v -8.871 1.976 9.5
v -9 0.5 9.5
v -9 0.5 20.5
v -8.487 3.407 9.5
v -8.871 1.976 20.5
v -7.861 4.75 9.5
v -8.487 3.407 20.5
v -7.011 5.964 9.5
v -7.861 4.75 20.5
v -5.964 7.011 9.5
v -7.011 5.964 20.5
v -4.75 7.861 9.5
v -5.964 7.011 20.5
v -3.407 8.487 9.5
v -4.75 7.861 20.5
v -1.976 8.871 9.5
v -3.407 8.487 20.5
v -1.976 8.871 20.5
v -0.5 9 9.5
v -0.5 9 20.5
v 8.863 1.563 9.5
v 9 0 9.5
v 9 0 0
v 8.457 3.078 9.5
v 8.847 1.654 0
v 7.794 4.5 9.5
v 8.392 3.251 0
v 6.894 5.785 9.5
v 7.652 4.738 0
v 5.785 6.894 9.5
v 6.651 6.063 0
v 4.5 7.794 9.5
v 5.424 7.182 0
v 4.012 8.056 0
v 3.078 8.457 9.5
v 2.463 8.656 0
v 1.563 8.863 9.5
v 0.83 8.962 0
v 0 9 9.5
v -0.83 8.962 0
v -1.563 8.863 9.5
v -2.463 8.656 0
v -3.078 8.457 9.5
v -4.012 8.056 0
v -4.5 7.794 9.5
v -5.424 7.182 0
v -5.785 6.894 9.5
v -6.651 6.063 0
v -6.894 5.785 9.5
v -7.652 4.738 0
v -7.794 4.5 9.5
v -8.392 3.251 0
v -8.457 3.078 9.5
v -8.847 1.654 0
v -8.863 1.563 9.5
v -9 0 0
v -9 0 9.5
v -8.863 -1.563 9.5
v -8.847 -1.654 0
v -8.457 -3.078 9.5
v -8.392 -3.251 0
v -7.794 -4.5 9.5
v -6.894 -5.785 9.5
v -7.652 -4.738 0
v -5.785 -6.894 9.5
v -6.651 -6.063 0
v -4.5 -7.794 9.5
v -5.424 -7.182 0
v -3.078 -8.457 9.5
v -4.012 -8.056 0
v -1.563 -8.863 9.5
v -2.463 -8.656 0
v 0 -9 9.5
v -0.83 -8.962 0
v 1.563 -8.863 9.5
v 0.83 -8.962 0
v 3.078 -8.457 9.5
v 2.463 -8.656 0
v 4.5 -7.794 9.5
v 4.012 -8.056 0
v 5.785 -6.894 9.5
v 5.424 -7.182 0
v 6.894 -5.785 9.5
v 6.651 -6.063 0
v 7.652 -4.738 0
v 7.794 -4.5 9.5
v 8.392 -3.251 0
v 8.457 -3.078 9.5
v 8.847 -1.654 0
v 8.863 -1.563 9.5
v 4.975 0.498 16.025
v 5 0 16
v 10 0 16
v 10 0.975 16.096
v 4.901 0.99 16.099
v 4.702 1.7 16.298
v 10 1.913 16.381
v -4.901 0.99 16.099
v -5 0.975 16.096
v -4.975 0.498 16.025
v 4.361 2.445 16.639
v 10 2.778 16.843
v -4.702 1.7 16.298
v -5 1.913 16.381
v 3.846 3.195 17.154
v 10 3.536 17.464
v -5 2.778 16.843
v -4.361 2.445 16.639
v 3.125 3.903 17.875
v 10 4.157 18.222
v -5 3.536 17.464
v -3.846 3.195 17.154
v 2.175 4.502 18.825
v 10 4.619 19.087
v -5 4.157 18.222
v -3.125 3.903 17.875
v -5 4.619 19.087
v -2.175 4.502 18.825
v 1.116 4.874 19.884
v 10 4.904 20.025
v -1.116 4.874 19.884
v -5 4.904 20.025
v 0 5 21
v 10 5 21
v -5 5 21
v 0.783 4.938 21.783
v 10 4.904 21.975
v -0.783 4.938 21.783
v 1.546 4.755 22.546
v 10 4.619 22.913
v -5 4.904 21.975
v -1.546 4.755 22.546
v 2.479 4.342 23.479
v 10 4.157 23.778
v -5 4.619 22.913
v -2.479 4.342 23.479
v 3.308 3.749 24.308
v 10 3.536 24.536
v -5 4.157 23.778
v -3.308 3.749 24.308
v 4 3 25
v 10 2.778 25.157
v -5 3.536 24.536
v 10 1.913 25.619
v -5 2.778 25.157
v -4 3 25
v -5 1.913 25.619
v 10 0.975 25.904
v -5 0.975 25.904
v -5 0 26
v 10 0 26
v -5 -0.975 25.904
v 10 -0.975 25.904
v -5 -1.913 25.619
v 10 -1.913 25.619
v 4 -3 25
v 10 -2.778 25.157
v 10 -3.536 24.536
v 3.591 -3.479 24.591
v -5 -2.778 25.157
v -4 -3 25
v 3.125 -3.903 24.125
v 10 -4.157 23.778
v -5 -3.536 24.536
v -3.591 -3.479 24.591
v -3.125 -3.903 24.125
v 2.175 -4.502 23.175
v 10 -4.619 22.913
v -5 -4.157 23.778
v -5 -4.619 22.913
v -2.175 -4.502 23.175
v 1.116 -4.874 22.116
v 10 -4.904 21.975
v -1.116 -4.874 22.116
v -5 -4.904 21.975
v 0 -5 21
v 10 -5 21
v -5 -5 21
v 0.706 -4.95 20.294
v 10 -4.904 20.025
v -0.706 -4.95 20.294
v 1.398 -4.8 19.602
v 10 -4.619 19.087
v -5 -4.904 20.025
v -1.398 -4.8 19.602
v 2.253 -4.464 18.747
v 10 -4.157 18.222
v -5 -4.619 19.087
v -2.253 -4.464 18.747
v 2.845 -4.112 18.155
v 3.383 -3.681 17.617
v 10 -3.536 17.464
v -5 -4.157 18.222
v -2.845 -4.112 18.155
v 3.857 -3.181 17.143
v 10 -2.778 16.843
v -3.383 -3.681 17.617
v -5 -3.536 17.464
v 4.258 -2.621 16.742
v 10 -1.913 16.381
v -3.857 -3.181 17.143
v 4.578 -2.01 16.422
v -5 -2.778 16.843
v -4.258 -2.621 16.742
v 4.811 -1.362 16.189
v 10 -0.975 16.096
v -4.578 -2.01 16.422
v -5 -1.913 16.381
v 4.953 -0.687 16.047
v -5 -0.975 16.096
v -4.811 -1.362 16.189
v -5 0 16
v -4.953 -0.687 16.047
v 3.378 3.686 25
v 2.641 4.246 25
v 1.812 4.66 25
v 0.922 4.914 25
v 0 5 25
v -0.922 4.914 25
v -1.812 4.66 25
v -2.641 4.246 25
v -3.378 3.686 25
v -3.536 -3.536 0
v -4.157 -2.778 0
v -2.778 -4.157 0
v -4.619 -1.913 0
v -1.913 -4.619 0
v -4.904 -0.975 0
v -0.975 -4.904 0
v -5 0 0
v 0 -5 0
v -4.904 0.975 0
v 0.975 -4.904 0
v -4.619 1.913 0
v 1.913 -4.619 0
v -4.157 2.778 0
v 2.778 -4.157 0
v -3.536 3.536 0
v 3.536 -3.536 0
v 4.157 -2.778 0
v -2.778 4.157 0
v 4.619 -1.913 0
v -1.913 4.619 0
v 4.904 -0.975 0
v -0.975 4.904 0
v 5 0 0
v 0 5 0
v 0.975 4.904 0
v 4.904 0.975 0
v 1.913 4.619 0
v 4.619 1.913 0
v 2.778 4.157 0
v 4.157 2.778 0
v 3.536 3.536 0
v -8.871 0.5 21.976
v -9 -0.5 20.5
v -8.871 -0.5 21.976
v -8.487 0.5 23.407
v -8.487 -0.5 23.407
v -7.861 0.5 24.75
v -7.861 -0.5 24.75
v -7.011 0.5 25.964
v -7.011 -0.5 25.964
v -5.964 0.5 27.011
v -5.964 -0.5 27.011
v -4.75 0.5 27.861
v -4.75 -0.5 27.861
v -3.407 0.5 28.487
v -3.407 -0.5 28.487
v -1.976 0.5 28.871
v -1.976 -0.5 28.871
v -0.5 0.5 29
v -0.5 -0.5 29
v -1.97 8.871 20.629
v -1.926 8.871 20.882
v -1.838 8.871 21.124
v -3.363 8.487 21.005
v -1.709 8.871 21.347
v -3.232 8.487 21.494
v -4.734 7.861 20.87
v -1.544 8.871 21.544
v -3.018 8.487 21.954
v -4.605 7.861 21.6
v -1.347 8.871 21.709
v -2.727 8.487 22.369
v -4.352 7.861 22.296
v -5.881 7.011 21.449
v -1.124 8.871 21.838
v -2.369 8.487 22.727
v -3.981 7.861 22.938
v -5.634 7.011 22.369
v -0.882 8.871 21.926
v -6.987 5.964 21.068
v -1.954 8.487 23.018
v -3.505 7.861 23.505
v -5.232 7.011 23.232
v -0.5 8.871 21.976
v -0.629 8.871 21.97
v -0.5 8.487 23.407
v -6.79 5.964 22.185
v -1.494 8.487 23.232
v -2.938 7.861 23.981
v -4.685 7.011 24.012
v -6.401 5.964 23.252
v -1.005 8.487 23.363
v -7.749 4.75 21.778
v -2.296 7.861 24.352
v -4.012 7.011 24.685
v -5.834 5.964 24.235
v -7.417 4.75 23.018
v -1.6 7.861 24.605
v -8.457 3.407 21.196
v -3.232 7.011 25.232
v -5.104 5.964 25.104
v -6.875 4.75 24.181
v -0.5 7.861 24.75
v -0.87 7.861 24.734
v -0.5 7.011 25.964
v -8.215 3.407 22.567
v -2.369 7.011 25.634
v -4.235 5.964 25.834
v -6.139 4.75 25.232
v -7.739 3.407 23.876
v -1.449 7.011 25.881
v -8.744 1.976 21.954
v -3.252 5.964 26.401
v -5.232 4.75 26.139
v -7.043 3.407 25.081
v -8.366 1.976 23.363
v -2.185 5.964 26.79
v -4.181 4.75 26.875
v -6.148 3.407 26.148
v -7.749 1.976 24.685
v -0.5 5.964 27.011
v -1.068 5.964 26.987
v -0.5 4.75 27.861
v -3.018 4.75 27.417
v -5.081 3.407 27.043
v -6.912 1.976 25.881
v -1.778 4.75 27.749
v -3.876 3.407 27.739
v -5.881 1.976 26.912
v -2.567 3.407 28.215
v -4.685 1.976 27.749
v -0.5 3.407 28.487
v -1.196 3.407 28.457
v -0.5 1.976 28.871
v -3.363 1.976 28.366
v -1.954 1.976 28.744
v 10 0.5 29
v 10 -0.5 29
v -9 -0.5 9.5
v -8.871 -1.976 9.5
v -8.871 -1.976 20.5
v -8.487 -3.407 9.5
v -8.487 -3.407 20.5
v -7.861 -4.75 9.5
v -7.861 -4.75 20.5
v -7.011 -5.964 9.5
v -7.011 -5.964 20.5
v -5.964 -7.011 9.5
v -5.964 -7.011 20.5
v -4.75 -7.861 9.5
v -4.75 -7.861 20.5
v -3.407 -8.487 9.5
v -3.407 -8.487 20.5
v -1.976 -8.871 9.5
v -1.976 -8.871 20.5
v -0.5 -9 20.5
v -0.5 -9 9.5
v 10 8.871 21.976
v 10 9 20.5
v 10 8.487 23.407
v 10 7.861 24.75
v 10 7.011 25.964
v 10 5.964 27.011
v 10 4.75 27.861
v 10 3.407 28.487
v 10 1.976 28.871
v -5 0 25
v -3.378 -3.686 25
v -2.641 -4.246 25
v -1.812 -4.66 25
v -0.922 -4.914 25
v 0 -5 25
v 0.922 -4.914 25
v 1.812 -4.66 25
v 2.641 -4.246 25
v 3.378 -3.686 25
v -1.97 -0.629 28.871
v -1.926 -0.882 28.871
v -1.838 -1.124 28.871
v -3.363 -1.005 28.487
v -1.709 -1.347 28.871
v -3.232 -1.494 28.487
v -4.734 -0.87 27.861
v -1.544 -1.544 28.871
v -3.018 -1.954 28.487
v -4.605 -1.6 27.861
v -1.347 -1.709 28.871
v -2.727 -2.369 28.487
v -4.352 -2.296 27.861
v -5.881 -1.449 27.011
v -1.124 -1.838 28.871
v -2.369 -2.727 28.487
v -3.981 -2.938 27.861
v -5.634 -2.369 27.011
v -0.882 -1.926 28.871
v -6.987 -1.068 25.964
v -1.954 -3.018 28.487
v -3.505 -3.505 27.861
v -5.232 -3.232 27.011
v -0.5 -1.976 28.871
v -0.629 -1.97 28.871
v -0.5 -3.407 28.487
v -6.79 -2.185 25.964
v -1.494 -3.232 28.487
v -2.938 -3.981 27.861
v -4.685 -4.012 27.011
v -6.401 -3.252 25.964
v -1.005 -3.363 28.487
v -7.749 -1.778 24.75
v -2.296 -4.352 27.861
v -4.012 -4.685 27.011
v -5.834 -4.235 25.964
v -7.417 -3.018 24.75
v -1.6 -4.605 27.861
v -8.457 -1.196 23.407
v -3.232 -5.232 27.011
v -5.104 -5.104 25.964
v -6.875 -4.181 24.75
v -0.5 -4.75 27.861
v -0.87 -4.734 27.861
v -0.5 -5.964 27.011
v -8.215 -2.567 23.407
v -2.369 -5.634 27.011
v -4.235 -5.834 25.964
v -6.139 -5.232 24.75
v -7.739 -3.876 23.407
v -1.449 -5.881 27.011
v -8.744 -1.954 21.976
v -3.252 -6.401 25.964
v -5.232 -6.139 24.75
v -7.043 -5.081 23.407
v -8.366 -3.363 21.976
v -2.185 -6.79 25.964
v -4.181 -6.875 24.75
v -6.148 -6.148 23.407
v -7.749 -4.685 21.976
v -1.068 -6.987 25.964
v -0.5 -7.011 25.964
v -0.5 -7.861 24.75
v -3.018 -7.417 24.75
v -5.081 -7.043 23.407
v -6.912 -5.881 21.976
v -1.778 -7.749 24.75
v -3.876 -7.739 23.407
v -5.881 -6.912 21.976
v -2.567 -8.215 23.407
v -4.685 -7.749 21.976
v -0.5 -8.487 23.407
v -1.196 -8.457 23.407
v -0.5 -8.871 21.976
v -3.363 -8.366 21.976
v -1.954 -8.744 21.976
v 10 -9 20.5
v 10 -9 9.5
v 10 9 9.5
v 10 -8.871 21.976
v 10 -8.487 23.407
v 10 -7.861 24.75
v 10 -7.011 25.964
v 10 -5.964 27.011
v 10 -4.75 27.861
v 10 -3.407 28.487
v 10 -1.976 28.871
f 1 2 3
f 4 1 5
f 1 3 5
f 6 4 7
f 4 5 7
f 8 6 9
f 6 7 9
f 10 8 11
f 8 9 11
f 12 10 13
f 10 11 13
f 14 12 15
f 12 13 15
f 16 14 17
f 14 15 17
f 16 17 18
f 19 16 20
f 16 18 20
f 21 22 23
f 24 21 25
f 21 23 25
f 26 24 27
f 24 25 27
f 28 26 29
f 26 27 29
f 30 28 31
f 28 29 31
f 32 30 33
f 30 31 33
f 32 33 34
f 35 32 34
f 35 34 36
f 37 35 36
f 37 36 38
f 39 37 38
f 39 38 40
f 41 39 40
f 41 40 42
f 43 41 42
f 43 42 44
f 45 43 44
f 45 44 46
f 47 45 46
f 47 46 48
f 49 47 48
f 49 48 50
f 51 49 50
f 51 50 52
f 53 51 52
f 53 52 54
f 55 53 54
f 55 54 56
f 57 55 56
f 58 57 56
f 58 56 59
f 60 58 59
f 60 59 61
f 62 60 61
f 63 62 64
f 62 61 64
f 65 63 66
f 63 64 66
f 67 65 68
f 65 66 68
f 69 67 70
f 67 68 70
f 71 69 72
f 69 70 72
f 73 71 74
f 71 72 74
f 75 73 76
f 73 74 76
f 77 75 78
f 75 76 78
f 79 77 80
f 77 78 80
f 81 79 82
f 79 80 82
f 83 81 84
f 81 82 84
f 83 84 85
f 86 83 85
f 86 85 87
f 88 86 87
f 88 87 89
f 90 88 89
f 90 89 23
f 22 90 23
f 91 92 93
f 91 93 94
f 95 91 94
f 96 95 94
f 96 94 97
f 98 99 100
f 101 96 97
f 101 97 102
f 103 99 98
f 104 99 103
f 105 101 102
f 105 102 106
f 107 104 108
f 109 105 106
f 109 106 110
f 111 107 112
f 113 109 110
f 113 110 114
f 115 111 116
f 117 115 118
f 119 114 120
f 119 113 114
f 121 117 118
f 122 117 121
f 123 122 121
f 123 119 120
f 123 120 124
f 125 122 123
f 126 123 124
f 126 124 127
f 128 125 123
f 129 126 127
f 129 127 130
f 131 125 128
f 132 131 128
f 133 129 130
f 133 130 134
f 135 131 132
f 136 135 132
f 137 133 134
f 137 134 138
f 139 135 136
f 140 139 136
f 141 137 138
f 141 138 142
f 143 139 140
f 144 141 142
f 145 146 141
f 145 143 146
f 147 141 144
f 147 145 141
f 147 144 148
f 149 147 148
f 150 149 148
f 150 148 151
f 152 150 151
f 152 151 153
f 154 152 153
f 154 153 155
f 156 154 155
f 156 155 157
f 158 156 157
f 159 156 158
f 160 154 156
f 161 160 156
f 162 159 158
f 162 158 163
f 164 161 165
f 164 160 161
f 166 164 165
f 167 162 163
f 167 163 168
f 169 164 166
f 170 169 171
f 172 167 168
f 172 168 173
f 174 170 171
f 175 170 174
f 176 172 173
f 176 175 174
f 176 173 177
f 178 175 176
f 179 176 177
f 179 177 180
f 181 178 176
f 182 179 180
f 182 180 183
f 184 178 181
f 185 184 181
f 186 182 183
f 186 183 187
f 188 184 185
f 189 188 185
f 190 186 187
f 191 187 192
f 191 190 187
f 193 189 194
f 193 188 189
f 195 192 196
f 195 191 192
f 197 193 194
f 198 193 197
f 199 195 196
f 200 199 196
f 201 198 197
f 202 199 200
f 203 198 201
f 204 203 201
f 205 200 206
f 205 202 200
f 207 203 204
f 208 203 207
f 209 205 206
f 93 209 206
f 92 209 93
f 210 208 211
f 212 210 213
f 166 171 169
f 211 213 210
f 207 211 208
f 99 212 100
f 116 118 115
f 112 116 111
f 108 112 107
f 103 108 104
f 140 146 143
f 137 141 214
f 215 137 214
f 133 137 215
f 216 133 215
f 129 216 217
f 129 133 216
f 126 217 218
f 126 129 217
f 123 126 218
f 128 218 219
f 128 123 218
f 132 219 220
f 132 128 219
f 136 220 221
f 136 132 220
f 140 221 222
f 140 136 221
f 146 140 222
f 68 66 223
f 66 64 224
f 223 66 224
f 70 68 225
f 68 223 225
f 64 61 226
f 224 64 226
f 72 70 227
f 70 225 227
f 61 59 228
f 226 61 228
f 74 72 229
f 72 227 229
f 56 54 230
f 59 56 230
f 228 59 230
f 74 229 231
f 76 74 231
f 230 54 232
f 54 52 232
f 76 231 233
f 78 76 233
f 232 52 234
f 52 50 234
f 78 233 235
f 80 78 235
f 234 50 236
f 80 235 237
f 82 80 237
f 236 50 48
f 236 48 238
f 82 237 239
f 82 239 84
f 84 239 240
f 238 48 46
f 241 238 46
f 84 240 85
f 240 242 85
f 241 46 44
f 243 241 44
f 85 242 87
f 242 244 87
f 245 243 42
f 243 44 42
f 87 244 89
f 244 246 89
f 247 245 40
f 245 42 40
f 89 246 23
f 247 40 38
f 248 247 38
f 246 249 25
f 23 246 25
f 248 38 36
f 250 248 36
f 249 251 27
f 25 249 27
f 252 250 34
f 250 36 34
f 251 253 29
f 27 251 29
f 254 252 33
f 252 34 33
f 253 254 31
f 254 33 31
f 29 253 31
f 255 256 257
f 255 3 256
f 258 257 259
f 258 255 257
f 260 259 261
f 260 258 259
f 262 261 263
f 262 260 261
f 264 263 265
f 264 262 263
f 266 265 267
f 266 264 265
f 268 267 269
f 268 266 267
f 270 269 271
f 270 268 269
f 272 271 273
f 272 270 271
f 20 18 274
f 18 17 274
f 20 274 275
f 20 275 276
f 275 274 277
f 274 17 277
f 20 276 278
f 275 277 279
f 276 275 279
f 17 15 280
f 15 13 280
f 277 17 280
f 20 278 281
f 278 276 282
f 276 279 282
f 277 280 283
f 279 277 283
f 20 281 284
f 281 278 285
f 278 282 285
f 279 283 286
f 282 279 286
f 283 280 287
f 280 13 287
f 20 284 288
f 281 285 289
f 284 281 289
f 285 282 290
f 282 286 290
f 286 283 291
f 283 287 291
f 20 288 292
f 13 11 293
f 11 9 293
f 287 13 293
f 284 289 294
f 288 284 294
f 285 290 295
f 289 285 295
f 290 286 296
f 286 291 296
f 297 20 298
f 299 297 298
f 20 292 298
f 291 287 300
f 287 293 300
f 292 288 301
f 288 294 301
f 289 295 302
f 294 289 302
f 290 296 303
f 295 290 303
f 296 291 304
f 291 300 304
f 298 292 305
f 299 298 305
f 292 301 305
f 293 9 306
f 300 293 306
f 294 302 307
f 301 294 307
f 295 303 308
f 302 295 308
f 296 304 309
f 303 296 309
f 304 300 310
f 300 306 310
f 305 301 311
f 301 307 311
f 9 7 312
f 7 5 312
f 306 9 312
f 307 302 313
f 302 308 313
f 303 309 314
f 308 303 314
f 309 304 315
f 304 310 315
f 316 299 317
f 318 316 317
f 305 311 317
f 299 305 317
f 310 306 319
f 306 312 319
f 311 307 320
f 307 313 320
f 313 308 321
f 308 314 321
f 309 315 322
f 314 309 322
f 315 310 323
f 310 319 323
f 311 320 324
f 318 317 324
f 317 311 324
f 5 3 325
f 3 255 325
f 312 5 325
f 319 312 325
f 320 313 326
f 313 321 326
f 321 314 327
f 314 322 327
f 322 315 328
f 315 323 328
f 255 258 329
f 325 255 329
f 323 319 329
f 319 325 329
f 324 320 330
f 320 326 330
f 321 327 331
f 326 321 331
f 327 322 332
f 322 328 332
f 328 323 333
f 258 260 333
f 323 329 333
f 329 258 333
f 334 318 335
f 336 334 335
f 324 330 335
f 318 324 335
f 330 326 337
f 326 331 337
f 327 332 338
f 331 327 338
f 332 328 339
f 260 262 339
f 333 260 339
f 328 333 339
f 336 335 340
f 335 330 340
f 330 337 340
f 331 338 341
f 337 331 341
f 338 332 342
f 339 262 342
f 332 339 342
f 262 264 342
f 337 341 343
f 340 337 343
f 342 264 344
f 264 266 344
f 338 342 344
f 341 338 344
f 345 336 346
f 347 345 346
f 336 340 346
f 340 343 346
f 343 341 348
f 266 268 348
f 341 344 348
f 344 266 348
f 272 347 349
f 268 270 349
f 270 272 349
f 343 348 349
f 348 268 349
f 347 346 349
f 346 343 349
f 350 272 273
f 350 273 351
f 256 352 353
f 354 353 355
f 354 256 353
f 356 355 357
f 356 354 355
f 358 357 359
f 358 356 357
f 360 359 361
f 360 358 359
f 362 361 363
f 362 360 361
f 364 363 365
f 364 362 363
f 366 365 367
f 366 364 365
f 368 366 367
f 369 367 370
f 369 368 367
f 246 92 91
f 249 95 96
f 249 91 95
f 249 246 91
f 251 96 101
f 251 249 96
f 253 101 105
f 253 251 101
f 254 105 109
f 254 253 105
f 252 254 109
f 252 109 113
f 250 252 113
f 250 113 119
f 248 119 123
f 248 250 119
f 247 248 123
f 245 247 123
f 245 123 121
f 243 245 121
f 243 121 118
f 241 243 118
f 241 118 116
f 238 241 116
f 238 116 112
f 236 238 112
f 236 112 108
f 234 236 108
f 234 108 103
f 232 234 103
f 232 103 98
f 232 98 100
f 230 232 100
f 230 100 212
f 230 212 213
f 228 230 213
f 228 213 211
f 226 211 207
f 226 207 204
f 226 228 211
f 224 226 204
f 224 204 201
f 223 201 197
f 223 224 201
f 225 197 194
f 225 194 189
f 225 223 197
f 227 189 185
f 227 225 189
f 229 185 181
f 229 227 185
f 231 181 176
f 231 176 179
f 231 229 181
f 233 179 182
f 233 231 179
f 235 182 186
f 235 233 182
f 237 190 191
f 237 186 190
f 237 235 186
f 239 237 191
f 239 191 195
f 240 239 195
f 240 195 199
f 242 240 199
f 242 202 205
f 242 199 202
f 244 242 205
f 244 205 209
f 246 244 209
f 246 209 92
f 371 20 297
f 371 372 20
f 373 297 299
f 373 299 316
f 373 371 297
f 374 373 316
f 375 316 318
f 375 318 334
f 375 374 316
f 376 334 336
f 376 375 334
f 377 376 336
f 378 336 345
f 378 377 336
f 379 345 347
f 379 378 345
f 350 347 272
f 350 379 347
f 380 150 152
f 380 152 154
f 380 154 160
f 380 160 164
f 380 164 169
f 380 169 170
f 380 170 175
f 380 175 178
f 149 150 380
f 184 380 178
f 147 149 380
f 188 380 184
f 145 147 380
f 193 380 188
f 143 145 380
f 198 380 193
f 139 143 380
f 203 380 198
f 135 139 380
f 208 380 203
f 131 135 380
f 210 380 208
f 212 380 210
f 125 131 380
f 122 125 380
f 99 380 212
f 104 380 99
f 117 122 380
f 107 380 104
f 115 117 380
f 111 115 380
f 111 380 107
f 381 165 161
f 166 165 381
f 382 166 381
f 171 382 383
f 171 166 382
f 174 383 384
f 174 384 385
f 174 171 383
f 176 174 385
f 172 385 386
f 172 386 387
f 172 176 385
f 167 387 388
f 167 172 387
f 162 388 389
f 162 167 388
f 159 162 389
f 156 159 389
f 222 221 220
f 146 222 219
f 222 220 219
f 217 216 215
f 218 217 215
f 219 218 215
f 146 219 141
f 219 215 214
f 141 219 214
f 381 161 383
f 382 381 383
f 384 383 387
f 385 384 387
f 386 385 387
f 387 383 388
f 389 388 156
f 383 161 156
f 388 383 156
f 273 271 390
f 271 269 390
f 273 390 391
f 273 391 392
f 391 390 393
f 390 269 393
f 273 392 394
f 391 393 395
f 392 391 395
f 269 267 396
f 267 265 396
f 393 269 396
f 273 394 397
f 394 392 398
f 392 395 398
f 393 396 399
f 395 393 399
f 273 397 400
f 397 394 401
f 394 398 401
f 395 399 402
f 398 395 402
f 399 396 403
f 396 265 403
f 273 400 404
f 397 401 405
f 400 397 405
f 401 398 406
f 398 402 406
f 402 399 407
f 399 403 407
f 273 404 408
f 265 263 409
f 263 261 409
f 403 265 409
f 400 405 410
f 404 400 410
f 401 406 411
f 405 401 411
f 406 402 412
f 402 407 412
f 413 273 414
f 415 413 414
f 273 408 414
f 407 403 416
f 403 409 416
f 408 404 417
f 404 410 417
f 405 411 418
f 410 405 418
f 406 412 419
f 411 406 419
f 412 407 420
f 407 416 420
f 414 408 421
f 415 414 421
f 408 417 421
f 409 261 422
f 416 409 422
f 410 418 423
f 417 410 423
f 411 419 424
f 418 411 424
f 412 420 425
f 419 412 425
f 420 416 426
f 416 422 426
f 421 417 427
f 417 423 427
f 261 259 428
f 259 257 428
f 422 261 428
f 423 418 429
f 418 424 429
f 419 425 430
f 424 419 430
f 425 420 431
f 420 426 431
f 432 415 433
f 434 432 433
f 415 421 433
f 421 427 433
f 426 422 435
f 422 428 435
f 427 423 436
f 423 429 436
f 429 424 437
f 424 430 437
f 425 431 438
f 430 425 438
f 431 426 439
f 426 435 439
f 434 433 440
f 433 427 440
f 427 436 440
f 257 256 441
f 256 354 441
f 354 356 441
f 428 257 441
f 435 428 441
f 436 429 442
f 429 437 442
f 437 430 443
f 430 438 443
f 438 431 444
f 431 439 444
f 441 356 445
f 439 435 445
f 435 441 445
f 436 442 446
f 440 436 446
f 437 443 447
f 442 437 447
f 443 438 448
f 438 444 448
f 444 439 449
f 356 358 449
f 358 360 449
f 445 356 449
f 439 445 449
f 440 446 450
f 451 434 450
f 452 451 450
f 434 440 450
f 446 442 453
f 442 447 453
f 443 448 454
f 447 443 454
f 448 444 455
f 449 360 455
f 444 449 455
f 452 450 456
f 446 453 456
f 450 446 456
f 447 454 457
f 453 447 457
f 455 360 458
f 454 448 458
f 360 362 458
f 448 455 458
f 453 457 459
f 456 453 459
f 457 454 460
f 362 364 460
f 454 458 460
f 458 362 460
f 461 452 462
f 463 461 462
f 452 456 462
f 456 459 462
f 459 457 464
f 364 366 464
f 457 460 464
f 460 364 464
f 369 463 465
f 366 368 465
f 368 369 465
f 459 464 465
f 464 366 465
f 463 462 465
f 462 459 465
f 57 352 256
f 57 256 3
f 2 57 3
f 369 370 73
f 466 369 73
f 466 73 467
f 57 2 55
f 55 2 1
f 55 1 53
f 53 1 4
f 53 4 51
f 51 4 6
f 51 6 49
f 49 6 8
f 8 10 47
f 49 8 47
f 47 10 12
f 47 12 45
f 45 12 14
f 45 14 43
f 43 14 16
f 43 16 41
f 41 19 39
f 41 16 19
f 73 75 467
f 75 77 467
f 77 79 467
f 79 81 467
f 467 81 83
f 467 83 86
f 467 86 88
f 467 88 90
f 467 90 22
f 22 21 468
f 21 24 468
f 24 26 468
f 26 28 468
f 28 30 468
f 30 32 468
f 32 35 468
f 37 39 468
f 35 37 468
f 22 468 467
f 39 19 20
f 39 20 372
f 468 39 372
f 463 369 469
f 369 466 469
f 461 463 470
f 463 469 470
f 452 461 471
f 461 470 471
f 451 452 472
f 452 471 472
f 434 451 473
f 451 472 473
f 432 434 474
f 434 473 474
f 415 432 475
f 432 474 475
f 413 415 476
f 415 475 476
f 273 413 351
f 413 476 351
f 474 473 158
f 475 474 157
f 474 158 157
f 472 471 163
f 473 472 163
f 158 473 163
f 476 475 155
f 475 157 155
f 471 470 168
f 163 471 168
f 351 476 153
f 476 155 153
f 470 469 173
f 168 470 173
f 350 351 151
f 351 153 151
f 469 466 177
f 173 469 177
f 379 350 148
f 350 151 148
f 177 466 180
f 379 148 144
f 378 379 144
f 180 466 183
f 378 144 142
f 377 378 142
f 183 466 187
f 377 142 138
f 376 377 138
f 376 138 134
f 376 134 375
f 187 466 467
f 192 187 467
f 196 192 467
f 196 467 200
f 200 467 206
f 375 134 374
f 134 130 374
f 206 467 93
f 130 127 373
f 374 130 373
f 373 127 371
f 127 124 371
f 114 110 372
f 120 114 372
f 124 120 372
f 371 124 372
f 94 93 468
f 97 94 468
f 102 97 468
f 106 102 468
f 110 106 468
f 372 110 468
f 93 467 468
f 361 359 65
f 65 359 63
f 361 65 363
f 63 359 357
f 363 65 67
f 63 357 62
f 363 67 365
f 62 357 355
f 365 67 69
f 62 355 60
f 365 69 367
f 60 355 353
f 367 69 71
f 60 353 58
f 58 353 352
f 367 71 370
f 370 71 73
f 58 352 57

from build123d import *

# Parameters (mm, degrees)
CYLINDER021_R     = 5
CYLINDER021_DEPTH = 25
CYLINDER022_R     = 5
CYLINDER022_DEPTH = 15
CYLINDER020_R     = 9
CYLINDER020_DEPTH = 9.5
BOX007_W          = 19
BOX007_H          = 18
BOX007_DEPTH      = 19.5
FILLET_R          = 8.5


with BuildPart() as tc_bottom_hole:
    # Cylinder021 → Cylinder021 (new body)
    with BuildSketch(Plane.XY):
        Circle(CYLINDER021_R)
    extrude(amount=CYLINDER021_DEPTH)


with BuildPart() as tc_holes:
    # Cylinder022 → Cylinder022 (new body)
    with BuildSketch(Plane(origin=(-5, 0, 21), x_dir=(0, 0, -1), z_dir=(1, 0, 0))):
        Circle(CYLINDER022_R)
    extrude(amount=CYLINDER022_DEPTH)

    # Fusion016: union TC-Bottom-Hole
    add(tc_bottom_hole.part)


with BuildPart() as tc_bottom:
    # Cylinder020 → Cylinder020 (new body)
    with BuildSketch(Plane.XY):
        Circle(CYLINDER020_R)
    extrude(amount=CYLINDER020_DEPTH)


with BuildPart() as turnablecorner:
    # Box007 → Box007 (new body)
    with BuildSketch(Plane(origin=(-9, -9, 9.5), x_dir=(1, 0, 0), z_dir=(0, 0, 1))):
        with Locations((9.5, 9)):
            Rectangle(BOX007_W, BOX007_H)
    extrude(amount=BOX007_DEPTH)

    # Fillet
    fillet_edges = [turnablecorner.edges().sort_by_distance(p)[0] for p in [
        (-9, -9, 19.25),
        (-9, 0, 29),
        (-9, 9, 19.25),
        (0.5, -9, 29),
        (0.5, 9, 29),
    ]]
    fillet(fillet_edges, radius=FILLET_R)

    # Fusion018: union TC-Bottom
    add(tc_bottom.part)

    # Cut009: cut TC-Holes
    add(tc_holes.part, mode=Mode.SUBTRACT)


solid = turnablecorner.part
